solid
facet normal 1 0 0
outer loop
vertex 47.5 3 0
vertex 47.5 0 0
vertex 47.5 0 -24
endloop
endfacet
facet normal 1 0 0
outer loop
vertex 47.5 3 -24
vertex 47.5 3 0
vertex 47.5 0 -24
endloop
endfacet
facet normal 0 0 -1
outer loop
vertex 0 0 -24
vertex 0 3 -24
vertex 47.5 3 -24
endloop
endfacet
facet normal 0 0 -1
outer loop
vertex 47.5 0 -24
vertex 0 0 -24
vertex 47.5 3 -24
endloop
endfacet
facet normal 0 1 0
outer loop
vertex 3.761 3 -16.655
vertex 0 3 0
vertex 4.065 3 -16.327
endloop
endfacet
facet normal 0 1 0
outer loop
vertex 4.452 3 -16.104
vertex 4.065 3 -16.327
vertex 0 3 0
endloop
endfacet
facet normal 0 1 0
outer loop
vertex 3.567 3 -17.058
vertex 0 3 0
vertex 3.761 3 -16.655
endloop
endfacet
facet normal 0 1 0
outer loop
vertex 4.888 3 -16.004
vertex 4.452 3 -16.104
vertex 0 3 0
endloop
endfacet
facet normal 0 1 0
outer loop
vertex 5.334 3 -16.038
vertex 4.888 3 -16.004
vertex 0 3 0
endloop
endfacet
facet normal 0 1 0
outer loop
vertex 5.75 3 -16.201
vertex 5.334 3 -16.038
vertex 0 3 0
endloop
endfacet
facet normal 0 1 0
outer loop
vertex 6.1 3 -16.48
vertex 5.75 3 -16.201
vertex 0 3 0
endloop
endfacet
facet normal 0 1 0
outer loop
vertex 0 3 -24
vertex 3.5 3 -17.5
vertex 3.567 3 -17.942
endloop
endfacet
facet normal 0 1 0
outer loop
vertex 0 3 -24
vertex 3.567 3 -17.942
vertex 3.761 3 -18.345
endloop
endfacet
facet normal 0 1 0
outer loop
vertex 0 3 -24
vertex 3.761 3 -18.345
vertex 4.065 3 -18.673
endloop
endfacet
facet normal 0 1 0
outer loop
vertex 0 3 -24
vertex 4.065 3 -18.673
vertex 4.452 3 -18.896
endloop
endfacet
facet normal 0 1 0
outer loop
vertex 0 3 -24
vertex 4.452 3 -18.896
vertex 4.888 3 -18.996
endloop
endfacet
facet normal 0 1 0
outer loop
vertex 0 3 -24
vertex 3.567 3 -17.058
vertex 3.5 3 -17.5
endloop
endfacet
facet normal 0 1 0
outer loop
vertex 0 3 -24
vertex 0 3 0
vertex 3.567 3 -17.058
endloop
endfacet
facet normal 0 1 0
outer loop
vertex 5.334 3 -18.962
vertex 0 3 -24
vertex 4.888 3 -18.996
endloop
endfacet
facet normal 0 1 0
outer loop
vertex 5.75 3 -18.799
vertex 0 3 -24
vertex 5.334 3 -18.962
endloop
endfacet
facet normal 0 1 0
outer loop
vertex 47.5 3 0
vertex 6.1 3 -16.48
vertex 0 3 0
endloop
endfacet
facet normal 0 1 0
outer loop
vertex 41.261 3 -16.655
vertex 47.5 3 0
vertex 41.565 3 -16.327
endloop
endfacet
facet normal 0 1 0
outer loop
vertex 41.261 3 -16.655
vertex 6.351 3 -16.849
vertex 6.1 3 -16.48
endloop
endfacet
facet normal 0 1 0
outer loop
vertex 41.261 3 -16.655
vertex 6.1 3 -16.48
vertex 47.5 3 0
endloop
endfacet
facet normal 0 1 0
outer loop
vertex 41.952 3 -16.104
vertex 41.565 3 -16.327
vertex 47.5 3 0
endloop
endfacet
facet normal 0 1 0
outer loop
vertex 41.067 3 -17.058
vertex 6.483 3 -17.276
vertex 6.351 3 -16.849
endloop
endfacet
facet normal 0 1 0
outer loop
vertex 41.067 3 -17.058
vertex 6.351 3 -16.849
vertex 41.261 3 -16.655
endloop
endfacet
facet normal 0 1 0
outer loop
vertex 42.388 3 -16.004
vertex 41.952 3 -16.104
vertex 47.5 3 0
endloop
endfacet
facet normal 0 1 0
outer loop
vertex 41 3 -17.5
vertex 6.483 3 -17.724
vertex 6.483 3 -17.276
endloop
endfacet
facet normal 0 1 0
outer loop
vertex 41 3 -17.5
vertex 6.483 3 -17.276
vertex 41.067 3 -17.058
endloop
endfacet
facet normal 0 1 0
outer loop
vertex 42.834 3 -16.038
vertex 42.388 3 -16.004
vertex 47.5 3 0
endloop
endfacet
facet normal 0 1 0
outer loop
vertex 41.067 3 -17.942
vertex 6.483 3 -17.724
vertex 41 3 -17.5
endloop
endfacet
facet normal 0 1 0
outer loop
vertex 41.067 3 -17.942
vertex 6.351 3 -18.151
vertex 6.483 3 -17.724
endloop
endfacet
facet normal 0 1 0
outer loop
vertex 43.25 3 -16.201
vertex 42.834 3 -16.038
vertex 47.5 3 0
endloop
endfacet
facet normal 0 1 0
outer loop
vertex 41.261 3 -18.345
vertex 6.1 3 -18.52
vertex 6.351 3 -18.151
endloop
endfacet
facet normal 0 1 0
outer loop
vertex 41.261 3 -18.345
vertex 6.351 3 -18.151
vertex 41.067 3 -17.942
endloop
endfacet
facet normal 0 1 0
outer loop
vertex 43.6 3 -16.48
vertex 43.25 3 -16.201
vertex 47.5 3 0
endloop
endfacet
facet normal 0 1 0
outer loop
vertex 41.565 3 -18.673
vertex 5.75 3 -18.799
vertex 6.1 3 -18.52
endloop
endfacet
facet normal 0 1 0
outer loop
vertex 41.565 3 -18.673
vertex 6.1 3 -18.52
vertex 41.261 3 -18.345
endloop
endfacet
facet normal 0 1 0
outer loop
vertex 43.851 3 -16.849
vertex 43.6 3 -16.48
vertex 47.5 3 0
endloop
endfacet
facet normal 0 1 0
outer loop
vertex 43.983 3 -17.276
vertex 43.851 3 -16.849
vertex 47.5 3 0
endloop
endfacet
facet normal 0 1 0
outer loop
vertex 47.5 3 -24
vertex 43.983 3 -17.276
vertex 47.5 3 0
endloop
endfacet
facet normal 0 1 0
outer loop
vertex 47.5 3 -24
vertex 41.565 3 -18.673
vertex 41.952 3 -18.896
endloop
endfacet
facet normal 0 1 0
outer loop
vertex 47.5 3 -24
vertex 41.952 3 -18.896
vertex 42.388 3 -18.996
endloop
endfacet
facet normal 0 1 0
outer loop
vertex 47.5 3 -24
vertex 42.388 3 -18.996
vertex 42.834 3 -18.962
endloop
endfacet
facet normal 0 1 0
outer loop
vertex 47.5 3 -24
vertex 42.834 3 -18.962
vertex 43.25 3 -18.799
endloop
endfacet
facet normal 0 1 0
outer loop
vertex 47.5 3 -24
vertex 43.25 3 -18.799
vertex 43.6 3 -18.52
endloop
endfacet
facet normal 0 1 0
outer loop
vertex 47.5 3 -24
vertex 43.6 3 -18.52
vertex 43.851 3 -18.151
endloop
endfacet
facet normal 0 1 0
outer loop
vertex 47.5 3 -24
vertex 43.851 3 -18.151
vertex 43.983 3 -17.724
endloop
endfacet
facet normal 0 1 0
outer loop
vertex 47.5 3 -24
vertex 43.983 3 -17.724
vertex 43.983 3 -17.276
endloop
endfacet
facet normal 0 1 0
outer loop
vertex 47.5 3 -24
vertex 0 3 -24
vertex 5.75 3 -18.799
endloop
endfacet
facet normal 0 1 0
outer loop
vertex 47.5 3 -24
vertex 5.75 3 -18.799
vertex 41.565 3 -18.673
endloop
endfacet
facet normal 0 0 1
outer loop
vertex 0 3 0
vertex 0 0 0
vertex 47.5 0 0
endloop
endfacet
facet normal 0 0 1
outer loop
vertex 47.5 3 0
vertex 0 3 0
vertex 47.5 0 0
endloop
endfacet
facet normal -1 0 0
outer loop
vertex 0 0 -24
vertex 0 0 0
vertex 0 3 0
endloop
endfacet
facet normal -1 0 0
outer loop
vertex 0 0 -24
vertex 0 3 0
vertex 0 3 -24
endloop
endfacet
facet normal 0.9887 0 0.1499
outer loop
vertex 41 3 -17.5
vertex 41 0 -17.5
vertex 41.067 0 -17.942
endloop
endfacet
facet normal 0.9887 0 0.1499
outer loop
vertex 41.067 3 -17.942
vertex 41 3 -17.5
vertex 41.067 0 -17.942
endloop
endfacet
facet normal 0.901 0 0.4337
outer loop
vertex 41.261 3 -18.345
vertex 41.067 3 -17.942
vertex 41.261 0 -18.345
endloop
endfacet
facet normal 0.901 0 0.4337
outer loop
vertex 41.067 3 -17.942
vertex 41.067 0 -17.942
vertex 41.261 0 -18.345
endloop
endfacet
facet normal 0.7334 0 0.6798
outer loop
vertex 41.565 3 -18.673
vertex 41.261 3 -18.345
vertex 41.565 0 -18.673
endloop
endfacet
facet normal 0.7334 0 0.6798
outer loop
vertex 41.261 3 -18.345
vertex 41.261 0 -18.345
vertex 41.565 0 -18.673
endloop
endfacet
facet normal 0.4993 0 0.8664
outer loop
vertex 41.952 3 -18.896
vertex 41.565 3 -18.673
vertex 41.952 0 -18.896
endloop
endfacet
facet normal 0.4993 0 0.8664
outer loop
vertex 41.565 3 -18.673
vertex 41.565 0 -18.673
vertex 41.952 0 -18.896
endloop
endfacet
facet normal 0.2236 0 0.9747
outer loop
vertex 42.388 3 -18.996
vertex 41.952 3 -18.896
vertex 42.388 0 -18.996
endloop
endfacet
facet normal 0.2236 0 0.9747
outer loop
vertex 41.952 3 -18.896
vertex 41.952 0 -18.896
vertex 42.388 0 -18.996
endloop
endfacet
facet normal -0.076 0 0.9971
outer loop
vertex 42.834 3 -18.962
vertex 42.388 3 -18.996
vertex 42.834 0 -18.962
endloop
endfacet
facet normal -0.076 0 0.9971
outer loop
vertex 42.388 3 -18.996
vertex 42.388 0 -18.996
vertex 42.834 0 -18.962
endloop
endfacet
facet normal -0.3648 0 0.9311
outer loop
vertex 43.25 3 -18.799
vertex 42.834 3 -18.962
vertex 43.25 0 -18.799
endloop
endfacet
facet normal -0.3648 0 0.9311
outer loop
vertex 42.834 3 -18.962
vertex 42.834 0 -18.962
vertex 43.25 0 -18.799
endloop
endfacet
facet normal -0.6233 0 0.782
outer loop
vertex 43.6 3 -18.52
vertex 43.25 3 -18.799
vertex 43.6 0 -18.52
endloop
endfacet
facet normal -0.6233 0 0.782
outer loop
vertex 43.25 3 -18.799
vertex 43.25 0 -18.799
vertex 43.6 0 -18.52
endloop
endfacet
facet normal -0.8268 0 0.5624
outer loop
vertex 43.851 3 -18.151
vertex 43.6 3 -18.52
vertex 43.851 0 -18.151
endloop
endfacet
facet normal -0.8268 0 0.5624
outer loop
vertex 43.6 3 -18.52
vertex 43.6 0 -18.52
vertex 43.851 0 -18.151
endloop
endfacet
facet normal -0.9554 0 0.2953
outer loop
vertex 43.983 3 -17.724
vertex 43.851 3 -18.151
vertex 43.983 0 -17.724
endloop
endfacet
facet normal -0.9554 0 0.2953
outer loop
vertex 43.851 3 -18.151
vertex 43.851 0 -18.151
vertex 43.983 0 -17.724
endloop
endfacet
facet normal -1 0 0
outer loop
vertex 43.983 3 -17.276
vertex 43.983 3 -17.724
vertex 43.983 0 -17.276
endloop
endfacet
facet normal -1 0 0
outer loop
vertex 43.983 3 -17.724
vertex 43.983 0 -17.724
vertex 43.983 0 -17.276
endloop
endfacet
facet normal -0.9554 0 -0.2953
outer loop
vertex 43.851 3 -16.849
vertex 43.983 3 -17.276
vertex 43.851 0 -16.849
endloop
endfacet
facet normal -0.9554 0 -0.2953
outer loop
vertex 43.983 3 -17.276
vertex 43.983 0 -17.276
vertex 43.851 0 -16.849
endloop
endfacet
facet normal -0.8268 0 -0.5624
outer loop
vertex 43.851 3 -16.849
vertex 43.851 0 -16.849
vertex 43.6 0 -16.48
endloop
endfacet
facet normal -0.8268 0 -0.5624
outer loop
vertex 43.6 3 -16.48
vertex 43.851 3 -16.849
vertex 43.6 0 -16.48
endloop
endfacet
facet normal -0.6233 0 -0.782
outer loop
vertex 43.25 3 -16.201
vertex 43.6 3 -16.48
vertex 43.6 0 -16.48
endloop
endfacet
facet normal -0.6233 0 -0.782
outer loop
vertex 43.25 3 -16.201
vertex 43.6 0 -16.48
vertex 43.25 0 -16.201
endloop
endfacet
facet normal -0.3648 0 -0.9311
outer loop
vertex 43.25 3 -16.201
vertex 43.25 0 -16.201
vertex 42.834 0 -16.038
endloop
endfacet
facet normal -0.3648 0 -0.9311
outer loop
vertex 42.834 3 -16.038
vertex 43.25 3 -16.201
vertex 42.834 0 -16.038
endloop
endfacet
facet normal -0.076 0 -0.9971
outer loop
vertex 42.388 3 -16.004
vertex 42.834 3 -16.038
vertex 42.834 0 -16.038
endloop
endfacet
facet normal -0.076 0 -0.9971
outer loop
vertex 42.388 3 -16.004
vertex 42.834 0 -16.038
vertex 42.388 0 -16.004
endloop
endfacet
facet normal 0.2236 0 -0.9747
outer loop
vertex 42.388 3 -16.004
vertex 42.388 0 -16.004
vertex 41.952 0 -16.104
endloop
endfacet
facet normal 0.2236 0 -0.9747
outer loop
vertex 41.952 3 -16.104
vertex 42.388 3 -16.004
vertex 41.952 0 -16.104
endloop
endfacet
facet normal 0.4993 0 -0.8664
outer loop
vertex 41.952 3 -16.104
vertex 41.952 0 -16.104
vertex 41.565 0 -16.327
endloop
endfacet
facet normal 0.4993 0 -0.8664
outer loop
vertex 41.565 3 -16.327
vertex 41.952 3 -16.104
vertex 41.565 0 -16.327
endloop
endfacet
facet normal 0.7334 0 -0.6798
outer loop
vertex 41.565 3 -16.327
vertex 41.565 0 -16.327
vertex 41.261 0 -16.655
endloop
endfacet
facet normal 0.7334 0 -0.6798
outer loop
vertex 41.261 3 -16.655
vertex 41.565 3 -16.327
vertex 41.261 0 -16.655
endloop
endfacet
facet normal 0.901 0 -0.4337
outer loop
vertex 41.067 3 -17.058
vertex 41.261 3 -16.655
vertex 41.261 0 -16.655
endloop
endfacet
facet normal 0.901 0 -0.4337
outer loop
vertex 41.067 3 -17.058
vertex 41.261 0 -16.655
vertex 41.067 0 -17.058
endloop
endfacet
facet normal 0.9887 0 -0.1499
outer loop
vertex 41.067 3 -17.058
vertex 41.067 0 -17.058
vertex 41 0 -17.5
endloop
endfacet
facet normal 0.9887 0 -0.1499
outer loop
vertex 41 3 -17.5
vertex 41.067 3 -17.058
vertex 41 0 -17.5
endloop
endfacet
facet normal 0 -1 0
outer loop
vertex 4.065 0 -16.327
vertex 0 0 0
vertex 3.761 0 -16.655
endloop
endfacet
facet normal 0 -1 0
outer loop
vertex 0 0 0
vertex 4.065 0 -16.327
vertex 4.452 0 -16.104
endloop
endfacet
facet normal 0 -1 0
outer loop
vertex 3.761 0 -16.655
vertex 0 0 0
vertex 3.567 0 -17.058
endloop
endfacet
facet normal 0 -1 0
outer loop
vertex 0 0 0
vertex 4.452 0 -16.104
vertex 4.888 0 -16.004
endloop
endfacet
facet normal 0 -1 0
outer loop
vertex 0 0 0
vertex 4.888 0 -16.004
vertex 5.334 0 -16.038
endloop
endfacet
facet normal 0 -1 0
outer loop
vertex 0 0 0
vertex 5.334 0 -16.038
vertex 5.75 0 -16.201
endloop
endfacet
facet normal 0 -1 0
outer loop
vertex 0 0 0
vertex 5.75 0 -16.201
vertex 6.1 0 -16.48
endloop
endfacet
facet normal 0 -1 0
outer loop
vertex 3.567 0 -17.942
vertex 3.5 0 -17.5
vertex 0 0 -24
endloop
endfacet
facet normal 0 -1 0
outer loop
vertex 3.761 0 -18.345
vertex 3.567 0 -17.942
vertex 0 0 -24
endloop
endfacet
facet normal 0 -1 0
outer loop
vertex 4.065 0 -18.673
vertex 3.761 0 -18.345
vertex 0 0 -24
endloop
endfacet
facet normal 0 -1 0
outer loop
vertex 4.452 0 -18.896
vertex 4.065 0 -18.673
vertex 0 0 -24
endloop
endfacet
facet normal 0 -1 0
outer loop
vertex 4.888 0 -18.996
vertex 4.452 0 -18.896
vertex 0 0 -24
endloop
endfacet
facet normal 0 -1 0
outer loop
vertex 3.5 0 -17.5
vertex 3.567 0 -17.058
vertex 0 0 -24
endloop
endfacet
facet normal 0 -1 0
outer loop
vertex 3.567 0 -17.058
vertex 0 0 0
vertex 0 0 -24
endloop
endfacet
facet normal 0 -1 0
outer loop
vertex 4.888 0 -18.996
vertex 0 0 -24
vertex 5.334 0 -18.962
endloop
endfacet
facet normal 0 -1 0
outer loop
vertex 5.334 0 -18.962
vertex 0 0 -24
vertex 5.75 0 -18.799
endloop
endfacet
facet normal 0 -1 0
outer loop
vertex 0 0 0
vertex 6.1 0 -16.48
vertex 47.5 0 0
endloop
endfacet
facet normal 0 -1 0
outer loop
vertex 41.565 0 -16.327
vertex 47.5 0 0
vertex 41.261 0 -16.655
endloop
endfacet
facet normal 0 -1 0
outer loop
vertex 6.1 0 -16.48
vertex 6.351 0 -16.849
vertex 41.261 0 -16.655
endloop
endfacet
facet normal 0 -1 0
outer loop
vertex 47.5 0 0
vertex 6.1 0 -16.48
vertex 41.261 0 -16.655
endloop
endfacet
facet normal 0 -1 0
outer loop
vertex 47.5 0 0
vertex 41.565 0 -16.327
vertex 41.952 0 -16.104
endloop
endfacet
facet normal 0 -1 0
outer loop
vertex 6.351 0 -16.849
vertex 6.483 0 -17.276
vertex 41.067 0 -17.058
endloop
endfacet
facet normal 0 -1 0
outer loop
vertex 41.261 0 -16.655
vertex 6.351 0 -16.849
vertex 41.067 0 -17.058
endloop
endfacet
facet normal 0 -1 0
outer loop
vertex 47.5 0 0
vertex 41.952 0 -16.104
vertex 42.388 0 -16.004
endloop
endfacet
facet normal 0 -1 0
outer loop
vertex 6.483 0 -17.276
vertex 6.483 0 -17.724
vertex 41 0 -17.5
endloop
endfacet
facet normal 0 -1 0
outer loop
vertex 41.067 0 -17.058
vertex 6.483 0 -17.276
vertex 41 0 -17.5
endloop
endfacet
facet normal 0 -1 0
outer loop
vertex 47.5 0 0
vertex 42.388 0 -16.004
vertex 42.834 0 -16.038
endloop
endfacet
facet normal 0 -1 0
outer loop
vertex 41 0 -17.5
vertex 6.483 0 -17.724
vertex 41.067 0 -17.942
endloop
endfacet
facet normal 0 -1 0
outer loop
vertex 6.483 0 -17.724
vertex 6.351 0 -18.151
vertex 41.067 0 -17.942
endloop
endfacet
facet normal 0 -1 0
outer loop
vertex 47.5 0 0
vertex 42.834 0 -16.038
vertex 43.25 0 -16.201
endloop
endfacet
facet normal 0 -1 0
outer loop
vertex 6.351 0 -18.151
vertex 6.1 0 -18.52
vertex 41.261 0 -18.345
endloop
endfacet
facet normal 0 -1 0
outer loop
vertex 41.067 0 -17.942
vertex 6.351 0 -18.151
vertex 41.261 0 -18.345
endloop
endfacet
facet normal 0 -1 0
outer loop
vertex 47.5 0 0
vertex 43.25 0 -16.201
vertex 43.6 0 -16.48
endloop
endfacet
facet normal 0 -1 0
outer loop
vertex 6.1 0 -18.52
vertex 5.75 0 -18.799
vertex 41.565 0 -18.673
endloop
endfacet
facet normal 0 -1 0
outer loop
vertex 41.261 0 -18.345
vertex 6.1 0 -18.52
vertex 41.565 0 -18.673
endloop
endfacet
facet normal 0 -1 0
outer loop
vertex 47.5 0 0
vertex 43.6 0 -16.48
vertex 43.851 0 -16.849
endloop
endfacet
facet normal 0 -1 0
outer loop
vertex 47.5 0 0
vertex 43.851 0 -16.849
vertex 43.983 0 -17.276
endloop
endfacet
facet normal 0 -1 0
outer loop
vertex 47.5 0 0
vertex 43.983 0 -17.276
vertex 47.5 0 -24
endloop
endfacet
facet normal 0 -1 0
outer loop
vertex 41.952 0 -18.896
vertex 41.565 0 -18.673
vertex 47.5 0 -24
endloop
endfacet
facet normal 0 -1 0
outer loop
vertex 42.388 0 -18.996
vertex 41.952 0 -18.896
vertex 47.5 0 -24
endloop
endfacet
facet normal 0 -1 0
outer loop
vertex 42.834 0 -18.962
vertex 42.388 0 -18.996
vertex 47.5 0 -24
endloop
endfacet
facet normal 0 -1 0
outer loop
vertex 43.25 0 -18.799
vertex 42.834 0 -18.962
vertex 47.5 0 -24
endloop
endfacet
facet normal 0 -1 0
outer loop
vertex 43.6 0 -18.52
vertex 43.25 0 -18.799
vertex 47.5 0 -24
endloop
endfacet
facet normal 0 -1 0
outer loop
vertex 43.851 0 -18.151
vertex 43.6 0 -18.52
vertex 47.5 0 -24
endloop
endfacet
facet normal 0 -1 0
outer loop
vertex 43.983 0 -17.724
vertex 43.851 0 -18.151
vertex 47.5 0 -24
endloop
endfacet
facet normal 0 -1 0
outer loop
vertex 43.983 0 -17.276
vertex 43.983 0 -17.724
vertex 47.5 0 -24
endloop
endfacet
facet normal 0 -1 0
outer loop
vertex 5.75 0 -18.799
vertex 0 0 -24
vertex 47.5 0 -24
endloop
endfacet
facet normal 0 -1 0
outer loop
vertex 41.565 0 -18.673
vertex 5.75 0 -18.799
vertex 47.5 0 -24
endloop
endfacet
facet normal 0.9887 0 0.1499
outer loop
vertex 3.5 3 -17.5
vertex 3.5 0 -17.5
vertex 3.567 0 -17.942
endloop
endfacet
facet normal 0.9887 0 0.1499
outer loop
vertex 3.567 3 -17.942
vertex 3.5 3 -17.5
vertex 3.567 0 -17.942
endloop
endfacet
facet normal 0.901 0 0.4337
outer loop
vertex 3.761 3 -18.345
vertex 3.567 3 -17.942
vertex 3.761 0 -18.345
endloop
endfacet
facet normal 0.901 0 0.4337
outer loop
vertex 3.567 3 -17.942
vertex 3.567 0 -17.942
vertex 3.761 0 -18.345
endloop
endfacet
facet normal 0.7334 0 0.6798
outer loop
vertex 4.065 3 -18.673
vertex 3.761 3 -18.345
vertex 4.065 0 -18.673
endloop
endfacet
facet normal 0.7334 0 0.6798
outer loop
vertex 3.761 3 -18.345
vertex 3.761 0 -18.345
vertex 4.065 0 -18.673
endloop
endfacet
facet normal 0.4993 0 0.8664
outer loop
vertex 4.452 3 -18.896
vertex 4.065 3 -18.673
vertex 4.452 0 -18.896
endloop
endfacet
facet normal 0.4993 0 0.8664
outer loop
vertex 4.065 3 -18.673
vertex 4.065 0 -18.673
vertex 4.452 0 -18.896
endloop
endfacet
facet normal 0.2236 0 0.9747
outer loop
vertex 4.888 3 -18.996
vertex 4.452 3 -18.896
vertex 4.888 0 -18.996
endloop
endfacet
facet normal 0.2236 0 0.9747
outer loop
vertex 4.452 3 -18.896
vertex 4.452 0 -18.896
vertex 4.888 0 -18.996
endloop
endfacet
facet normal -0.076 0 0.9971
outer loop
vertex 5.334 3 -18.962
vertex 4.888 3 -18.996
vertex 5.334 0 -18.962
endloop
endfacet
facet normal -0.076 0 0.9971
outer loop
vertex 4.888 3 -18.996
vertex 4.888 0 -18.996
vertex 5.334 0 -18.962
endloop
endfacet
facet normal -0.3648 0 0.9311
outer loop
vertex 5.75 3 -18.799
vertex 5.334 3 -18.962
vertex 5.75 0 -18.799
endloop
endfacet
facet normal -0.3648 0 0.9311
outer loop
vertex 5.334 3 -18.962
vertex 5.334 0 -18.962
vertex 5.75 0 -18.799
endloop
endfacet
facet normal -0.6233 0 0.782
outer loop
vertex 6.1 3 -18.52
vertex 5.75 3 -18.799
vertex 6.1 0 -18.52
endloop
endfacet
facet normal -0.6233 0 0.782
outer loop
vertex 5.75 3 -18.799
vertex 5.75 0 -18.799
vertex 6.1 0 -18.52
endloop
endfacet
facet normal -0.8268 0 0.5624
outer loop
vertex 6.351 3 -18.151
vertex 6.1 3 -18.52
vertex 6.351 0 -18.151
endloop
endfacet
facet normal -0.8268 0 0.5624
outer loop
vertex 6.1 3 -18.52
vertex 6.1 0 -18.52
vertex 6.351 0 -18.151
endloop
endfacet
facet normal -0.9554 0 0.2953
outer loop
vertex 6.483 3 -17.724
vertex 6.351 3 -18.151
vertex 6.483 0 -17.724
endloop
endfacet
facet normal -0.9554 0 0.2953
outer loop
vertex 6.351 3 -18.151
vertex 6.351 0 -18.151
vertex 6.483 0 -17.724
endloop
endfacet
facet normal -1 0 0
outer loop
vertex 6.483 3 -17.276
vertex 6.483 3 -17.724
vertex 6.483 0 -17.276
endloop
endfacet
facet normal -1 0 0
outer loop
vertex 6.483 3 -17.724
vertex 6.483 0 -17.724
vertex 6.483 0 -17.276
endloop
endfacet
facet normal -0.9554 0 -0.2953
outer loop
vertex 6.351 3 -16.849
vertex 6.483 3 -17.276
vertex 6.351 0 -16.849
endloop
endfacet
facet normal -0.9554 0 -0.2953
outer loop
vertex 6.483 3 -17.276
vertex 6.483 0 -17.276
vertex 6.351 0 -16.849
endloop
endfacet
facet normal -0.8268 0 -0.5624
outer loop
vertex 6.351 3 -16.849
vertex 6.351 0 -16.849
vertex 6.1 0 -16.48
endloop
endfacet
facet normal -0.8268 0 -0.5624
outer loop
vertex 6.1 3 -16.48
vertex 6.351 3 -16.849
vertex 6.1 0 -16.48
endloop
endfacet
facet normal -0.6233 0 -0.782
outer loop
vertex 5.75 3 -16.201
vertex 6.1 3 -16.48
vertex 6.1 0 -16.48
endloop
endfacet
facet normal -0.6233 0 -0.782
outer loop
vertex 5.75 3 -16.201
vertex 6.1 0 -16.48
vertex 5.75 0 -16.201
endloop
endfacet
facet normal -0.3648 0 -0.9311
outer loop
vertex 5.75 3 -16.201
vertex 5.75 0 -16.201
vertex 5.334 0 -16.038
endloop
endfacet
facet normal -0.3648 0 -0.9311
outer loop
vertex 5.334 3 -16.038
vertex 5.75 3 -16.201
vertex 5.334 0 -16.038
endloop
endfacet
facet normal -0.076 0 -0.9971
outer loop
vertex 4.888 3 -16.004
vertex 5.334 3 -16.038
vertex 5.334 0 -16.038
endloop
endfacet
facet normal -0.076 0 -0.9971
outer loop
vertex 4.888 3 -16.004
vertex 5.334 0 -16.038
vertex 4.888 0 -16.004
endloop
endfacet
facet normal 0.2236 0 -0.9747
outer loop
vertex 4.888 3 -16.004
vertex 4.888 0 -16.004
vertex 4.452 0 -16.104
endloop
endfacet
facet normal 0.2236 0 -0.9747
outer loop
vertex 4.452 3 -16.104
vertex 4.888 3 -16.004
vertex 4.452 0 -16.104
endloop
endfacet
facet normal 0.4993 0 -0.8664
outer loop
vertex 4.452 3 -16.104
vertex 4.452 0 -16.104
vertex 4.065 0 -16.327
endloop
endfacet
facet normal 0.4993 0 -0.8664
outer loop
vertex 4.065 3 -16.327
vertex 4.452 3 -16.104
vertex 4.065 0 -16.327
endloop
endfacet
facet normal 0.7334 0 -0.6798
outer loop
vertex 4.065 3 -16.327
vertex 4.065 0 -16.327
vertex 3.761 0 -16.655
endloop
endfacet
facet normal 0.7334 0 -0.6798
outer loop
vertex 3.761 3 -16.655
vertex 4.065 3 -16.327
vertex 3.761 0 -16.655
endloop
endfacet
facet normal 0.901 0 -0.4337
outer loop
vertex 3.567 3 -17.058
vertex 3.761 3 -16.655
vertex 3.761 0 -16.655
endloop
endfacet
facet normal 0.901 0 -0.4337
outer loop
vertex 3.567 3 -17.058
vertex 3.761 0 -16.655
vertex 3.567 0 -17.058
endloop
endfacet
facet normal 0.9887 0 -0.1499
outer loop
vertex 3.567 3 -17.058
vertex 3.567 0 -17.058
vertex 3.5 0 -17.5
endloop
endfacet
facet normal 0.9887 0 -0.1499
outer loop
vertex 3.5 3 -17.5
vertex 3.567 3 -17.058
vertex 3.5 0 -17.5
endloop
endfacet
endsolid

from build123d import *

# Parameters (mm, degrees)
SKETCH2_W                 = 47.5
SKETCH2_H                 = 35
BOSS_EXTRUDE1_DEPTH       = 3
F_3_0MM_DOWEL_HOLE1_D     = 3
F_3_0MM_DOWEL_HOLE1_DEPTH = 3
CUT_EXTRUDE1_REACH        = 5
SKETCH5_W                 = 47.5
SKETCH5_H                 = 11


with BuildPart() as part:
    # Sketch2 → Boss-Extrude1 (new body)
    with BuildSketch(Plane(origin=(0, 0, 0), x_dir=(1, 0, 0), z_dir=(0, 1, 0))):
        with Locations((23.75, 17.5)):
            Rectangle(SKETCH2_W, SKETCH2_H)
    extrude(amount=BOSS_EXTRUDE1_DEPTH)

    # Ø3.0mm Dowel Hole1
    with Locations(Plane(origin=(0, 3, 0), x_dir=(1, 0, 0), z_dir=(0, 1, 0))):
        with Locations((5, 17.5), (42.5, 17.5)):
            Hole(F_3_0MM_DOWEL_HOLE1_D / 2, depth=F_3_0MM_DOWEL_HOLE1_DEPTH)

    # Sketch5 → Cut-Extrude1 (cut, up to next)
    with BuildSketch(Plane(origin=(0, 3, 0), x_dir=(1, 0, 0), z_dir=(0, 1, 0)), mode=Mode.PRIVATE) as cut_extrude1_sk1:
        with Locations((23.75, 29.5)):
            Rectangle(SKETCH5_W, SKETCH5_H)
    cut_extrude1_tool1 = extrude(cut_extrude1_sk1.sketch, amount=-CUT_EXTRUDE1_REACH, mode=Mode.PRIVATE) & part.part
    add(cut_extrude1_tool1.solids().sort_by_distance((23.75, 3, -29.5))[0], mode=Mode.SUBTRACT)


solid = part.part
